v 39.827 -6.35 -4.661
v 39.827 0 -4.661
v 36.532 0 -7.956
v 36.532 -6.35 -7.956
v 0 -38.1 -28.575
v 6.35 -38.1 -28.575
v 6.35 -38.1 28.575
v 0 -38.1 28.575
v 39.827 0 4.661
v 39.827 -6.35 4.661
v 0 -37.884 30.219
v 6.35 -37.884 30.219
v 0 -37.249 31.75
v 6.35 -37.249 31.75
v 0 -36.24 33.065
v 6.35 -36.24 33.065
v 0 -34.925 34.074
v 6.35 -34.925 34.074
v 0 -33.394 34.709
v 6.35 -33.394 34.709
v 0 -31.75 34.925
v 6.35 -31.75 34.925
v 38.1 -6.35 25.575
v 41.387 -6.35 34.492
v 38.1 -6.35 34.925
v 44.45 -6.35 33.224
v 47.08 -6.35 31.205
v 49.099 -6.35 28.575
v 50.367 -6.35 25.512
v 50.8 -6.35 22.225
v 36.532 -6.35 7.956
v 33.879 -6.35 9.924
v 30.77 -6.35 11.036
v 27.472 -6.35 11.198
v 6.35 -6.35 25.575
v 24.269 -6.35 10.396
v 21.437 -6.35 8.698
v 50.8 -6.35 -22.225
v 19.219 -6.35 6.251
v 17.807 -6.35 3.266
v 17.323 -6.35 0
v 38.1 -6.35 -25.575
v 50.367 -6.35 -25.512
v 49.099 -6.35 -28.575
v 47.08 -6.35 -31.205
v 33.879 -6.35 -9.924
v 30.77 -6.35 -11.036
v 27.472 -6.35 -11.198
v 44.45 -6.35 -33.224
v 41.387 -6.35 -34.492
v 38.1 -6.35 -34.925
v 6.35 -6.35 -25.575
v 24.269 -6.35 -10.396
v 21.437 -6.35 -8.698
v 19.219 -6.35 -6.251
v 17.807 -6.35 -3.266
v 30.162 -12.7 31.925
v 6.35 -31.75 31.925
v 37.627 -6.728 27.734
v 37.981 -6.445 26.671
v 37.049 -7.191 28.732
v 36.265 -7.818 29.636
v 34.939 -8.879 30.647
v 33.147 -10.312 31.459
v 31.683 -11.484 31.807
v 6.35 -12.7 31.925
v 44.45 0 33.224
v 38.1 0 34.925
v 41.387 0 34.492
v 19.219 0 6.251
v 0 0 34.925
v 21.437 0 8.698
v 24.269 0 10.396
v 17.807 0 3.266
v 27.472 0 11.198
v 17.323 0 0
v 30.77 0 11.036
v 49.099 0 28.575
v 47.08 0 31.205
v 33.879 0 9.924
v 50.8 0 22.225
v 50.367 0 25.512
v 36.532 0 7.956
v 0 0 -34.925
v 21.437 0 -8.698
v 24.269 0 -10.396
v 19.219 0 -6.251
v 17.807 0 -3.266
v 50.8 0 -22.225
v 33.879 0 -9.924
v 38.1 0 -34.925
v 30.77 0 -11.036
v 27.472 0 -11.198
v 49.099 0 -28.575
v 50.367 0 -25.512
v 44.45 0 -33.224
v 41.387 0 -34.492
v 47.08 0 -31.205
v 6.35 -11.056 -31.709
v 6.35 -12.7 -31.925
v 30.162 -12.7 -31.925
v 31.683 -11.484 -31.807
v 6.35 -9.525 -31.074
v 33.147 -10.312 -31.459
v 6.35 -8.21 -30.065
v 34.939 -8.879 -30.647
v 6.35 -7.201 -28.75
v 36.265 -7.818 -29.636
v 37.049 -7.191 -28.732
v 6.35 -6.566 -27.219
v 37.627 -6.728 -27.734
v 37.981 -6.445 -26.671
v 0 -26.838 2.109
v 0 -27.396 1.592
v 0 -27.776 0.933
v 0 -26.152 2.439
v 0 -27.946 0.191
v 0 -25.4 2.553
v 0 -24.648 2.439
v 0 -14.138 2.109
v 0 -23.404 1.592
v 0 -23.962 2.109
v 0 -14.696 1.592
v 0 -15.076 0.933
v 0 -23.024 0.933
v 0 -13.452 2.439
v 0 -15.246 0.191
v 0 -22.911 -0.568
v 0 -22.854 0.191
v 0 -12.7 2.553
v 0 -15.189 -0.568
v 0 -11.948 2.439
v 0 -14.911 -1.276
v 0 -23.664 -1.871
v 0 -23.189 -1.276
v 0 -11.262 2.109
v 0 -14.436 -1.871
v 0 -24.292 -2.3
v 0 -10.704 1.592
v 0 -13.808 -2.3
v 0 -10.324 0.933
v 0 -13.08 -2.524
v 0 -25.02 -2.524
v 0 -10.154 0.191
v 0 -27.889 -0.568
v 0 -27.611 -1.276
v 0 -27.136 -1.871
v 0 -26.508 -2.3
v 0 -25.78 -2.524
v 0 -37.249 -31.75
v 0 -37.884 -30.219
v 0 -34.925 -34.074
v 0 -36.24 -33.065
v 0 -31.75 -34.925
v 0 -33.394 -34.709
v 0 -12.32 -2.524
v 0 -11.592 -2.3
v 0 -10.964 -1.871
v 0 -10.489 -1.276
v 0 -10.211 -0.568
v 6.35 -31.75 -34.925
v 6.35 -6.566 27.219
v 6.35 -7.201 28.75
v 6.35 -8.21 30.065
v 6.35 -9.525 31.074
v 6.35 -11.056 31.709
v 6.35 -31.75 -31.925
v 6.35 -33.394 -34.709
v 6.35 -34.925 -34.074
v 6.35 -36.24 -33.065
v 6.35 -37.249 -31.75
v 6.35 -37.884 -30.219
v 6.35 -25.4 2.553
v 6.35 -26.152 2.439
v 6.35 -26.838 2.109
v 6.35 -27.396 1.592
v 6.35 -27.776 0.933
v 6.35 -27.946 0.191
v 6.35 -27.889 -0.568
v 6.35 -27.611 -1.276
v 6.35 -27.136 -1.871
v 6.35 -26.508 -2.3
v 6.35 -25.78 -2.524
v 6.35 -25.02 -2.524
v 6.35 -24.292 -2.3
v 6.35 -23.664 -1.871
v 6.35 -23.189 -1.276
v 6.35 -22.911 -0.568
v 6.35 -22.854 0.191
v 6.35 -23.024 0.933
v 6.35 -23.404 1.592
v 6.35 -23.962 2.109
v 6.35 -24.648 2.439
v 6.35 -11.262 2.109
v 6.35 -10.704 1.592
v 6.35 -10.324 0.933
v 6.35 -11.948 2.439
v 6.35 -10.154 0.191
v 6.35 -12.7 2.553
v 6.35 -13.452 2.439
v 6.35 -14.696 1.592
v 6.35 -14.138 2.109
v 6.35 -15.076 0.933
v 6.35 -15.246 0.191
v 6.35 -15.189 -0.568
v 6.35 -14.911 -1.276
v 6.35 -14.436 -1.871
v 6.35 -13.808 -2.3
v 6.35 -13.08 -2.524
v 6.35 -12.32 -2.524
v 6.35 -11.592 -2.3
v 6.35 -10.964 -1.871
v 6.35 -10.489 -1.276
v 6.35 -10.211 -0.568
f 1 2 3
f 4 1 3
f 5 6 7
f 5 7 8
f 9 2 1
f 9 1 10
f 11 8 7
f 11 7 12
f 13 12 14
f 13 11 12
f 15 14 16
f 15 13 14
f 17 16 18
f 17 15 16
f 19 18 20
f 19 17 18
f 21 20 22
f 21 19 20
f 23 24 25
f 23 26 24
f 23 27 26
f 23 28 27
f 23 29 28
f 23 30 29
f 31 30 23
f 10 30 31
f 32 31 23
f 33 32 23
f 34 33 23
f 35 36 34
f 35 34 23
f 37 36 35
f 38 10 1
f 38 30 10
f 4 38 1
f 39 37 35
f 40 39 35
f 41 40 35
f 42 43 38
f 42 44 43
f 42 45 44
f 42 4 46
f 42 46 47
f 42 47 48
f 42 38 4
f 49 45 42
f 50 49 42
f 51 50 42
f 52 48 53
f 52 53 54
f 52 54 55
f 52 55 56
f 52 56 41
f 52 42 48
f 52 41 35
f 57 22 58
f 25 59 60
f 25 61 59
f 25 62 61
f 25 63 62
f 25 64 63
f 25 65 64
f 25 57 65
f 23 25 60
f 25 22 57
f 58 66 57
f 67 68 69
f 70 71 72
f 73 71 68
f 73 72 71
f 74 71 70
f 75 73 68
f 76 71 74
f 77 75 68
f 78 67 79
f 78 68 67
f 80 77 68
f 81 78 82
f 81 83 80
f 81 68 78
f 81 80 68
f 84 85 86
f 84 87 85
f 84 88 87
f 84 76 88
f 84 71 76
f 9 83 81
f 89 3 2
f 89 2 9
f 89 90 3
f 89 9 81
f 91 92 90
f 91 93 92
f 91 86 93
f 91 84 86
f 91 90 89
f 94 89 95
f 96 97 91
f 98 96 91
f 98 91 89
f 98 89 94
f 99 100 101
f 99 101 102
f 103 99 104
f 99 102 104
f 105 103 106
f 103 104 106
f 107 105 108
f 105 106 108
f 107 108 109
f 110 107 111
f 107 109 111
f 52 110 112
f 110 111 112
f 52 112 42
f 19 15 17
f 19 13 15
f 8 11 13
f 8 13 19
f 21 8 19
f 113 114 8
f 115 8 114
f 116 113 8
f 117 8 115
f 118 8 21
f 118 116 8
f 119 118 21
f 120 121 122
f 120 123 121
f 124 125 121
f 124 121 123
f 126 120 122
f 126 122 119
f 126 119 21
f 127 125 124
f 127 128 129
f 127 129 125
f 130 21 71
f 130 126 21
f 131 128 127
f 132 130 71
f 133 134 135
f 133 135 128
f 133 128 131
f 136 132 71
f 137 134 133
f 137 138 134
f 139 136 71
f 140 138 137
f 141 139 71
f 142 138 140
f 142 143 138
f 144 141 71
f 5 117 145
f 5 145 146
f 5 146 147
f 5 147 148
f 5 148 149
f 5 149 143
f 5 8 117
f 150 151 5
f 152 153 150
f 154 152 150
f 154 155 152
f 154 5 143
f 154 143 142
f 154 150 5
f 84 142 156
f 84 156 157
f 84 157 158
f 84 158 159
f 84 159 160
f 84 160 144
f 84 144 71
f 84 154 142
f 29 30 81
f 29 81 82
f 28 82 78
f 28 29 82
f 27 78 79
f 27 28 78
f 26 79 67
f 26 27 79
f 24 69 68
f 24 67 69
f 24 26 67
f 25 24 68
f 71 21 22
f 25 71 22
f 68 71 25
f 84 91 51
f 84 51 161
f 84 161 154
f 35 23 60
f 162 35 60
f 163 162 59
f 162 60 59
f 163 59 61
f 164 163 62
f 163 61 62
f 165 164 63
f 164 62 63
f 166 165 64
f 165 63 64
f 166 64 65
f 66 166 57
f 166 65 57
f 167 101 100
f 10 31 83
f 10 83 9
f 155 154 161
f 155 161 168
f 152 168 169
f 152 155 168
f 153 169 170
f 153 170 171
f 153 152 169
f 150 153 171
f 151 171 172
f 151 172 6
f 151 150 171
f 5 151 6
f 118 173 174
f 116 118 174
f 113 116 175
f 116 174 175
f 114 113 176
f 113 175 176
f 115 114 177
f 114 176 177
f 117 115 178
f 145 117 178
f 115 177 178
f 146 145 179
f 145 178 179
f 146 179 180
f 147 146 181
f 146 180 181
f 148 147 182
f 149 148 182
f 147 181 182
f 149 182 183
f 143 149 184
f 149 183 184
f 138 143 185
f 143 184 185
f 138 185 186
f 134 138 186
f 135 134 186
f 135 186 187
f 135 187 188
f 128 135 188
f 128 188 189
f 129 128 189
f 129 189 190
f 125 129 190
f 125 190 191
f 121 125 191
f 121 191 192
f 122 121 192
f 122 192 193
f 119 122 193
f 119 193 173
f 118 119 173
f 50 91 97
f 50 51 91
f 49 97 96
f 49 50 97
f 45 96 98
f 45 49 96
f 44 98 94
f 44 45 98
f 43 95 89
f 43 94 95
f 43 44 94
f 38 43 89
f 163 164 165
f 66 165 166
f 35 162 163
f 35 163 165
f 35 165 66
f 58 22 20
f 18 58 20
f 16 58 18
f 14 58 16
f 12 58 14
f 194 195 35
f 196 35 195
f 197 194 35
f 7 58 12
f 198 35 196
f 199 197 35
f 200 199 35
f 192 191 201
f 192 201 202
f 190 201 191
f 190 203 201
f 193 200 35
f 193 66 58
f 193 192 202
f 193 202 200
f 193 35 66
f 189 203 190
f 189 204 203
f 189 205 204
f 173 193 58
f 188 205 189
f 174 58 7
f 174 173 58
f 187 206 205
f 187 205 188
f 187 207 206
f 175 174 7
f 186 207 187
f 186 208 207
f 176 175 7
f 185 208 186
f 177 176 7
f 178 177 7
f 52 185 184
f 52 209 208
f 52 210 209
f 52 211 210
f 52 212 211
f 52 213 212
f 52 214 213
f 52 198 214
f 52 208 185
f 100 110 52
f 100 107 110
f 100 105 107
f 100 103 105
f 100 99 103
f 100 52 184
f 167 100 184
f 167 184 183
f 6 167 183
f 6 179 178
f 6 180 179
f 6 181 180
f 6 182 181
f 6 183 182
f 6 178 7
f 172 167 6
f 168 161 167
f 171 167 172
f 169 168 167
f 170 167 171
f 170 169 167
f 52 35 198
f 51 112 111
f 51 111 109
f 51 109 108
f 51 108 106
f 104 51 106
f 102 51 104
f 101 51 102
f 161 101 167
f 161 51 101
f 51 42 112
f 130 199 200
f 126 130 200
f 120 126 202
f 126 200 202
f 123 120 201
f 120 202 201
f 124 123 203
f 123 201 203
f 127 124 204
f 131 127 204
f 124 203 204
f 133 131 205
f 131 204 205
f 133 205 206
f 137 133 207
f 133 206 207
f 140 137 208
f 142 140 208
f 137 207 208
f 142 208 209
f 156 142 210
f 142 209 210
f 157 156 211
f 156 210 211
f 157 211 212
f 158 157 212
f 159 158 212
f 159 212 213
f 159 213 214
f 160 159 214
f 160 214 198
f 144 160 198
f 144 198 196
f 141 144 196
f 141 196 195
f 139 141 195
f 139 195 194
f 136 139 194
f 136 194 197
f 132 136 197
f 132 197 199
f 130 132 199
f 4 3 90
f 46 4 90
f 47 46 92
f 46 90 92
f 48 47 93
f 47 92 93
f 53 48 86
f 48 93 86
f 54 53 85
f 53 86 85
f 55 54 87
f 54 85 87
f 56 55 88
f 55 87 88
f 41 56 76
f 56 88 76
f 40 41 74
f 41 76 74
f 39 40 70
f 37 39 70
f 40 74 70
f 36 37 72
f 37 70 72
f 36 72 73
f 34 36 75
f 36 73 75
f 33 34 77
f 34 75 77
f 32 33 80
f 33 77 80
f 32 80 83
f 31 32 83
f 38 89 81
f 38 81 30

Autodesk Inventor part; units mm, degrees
ref_plane "YZ Plane" through (0, 0, 0) normal (1, 0, 0) x (0, 1, 0)
ref_plane "XZ Plane" through (0, 0, 0) normal (0, 1, 0) x (-1, 0, 0)
ref_plane "XY Plane" through (0, 0, 0) normal (0, 0, 1) x (1, 0, 0)
sketch "Sketch1" plane through (0, 0, 0) normal (0, 0, 1) x (1, 0, 0)
  line L0 (0, 0) -> (50.8, 0)
  line L1 (50.8, 0) -> (50.8, -6.35)
  line L2 (50.8, -6.35) -> (6.35, -6.35)
  line L3 (6.35, -6.35) -> (6.35, -38.1)
  line L4 (6.35, -38.1) -> (0, -38.1)
  line L5 (0, -38.1) -> (0, 0)
  dimension "d0" = 50.8
  dimension "d1" = 38.1
  dimension "d2" = 6.35
  dimension "d3" = 6.35
extrude "Extrusion1" add sketch "Sketch1" along normal mid plane 69.85
sketch "Sketch2" plane through (0, 0, 34.925) normal (0, 1, 0) x (1, 0, 0)
  line L0 (0, 69.85) -> (0, 0) construction
  line L1 (50.8, 0) -> (0, 0) construction
  line L2 (50.8, 69.85) -> (50.8, 0) construction
  line L3 (0, 69.85) -> (50.8, 69.85) construction
  circle A0 centre (28.575, 34.925) radius 11.2522
  line L4 (0, 0) -> (0, 69.85) construction
  line L5 (6.35, 69.85) -> (6.35, 0) construction
  line L6 (6.35, 69.85) -> (6.35, 0) construction
  line L7 (6.35, 69.85) -> (6.35, 0) construction
  line L8 (6.35, 69.85) -> (50.8, 69.85) construction
  line L9 (41.525, 36.525) -> (41.525, 33.325) construction
  line L10 (41.525, 36.525) -> (39.7129, 36.525) construction
  line L11 (41.525, 33.325) -> (39.7129, 33.325) construction
  line L12 (36.5315, 26.9685) -> (44.488, 34.925)
  line L13 (44.488, 34.925) -> (36.5315, 42.8815)
  line L14 (36.5315, 42.8815) -> (39.8272, 42.8815)
  line L15 (39.8272, 42.8815) -> (39.8272, 26.9685)
  line L16 (39.8272, 26.9685) -> (36.5315, 26.9685)
  line L17 (36.5315, 26.9685) -> (36.5315, 42.8815) construction
  point P0 (0, 34.925)
  point P1 (0, 34.925)
  point P2 (28.575, 69.85)
  point P3 (41.525, 34.925)
  point P4 (39.8272, 34.925)
  point P5 (39.8272, 39.5858)
  point P6 (39.8272, 30.2642)
  dimension "d6" = 22.5044
  dimension "d16" = 3.2
  dimension "d17" = 12.95
sketch "Sketch3" plane through (0, -38.1, 34.925) normal (-1, 0, 0) x (0, 0, 1)
  line L0 (0, 0) -> (-69.85, 0) construction
  line L1 (0, 38.1) -> (0, 0) construction
  line L2 (-69.85, 38.1) -> (0, 38.1) construction
  line L3 (-69.85, 0) -> (-69.85, 38.1) construction
  line L4 (-9.525, 25.4) -> (-60.325, 25.4) construction
  line L5 (-60.325, 25.4) -> (-60.325, 12.7) construction
  line L6 (-60.325, 12.7) -> (-9.525, 12.7) construction
  line L7 (-9.525, 12.7) -> (-9.525, 25.4) construction
  line L8 (-9.525, 25.4) -> (-60.325, 12.7) construction
  line L9 (-60.325, 25.4) -> (-9.525, 12.7) construction
  point P0 (-34.925, 38.1)
  point P1 (-34.925, 19.05)
  point P2 (-34.925, 38.1)
  point P3 (0, 19.05)
  point P4 (-34.925, 12.7)
  point P5 (-34.925, 25.4)
  dimension "d7" = 50.8
  dimension "d8" = 12.7
hole "Hole1" at (0, -12.7, -25.4) at (0, -25.4, -25.4) at (0, -25.4, 25.4) at (0, -12.7, 25.4) direction (1, 0, 0) diameter 5.1054 end through all clearance for "Flat Head Machine Screw (82)" size "#10" standard "Ansi Unified Screw Threads"
extrude "Extrusion2" cut sketch "Sketch2" against normal through all contours A0 | L15 L12 A0 | A0 L13 L15
fillet "Fillet1" [suppressed]
fillet "Fillet2" radius 12.7 2 edges at (50.8, -3.175, -34.925) (50.8, -3.175, 34.925)
fillet "Fillet3" radius 6.35 2 edges at (3.175, -38.1, -34.925) (3.175, -38.1, 34.925)
sketch "Sketch5" plane through (0, 0, -34.925) normal (0, 0, -1) x (-1, 0, 0)
  line L0 (0, -31.75) -> (-6.35, -31.75) construction
  line L1 (0, -31.75) -> (0, 0) construction
  line L2 (0, 0) -> (-38.1, 0) construction
  line L3 (-38.1, -6.35) -> (-38.1, 0) construction
  line L4 (-38.1, -6.35) -> (-6.35, -6.35) construction
  line L5 (-6.35, -6.35) -> (-6.35, -31.75) construction
  line L6 (-38.1, -6.35) -> (-6.35, -31.75)
  line L7 (-6.35, -6.35) -> (-6.35, -31.75)
  line L8 (-6.35, -27.9527) -> (-6.35, -22.8473) construction
  line L9 (-6.35, -6.35) -> (-38.1, -6.35)
  line L10 (-17.3228, -6.35) -> (-17.3228, -6.35) construction
  point P0 (-36.5315, -6.35)
extrude "Extrusion3" add sketch "Sketch5" against normal blind 3
mirror "Mirror1" about plane through (0, 0, 0) normal (0, 0, 1) of "Extrusion3"
fillet "Fillet4" radius 6.35 2 edges at (22.225, -6.35, 31.925) (22.225, -6.35, -31.925)
sketch "Sketch6" plane through (6.35, -38.1, 28.575) normal (1, 0, 0) x (0, 0, -1)
  line L0 (43.4887, 15.24) -> (13.6613, 15.24) construction
  line L1 (13.6613, 15.24) -> (13.6613, 22.86) construction
  line L2 (13.6613, 22.86) -> (43.4887, 22.86) construction
  line L3 (43.4887, 22.86) -> (43.4887, 15.24) construction
  line L4 (50.8, 38.1) -> (6.35, 38.1) construction
  circle A0 centre (3.175, 25.4) radius 2.5527 construction
  circle A1 centre (3.175, 12.7) radius 2.5527 construction
  line L5 (3.175, 25.4) -> (3.175, 12.7) construction
  point P0 (28.575, 38.1)
  point P1 (28.575, 15.24)
  point P2 (28.575, 38.1)
  point P3 (43.4887, 19.05)
  point P4 (3.175, 19.05)
  point P5 (13.6613, 19.05)
  point P6 (28.575, 22.86)
  point P7 (28.575, 38.1)
  dimension "d0" = 50.8
  dimension "d1" = 38.1
  dimension "d2" = 6.35
  dimension "d3" = 6.35
  dimension "d29" = 7.62
  dimension "d30" = 29.8274
extrude "Extrusion4" [suppressed]
sketch "Sketch7" plane through (6.35, -38.1, 28.575) normal (1, 0, 0) x (0, 0, -1)
  point P0 (28.575, 38.1)
sketch "Sketch8" plane through (0, 0, -34.925) normal (-1, 0, 0) x (0, 0, 1)
  arc A0 (0, -31.75) -> (6.35, -38.1) centre (6.35, -31.75) ccw construction
  line L0 (0, -31.75) -> (0, 0) construction
  line L1 (0, 0) -> (69.85, 0) construction
  line L2 (69.85, 0) -> (69.85, -31.75) construction
  arc A1 (63.5, -38.1) -> (69.85, -31.75) centre (63.5, -31.75) ccw construction
  line L3 (63.5, -38.1) -> (6.35, -38.1) construction
  circle A2 centre (60.325, -25.4) radius 2.5527 projected
  circle A3 centre (9.525, -12.7) radius 2.5527 projected
  circle A4 centre (9.525, -25.4) radius 2.5527 projected
  circle A5 centre (60.325, -12.7) radius 2.5527 projected
  line L4 (60.325, -25.4) -> (9.525, -25.4) construction
  line L5 (9.525, -25.4) -> (9.525, -12.7) construction
  line L6 (9.525, -12.7) -> (60.325, -12.7) construction
  line L7 (60.325, -12.7) -> (60.325, -25.4) construction
  point P0 (34.925, 0)
  point P1 (34.925, -25.4)
  point P2 (34.925, -12.7)
hole "Hole2" at (0, -25.4, 0) at (0, -12.7, 0) direction (1, 0, 0) diameter 5.1054 end through all clearance for "Flat Head Machine Screw (82)" size "#10" standard "Ansi Unified Screw Threads"
extrude "Extrusion5" add sketch "Sketch8" against normal up to surface (6.35 mm away)
properties part number "rsl mount" material "ABS Plastic"
